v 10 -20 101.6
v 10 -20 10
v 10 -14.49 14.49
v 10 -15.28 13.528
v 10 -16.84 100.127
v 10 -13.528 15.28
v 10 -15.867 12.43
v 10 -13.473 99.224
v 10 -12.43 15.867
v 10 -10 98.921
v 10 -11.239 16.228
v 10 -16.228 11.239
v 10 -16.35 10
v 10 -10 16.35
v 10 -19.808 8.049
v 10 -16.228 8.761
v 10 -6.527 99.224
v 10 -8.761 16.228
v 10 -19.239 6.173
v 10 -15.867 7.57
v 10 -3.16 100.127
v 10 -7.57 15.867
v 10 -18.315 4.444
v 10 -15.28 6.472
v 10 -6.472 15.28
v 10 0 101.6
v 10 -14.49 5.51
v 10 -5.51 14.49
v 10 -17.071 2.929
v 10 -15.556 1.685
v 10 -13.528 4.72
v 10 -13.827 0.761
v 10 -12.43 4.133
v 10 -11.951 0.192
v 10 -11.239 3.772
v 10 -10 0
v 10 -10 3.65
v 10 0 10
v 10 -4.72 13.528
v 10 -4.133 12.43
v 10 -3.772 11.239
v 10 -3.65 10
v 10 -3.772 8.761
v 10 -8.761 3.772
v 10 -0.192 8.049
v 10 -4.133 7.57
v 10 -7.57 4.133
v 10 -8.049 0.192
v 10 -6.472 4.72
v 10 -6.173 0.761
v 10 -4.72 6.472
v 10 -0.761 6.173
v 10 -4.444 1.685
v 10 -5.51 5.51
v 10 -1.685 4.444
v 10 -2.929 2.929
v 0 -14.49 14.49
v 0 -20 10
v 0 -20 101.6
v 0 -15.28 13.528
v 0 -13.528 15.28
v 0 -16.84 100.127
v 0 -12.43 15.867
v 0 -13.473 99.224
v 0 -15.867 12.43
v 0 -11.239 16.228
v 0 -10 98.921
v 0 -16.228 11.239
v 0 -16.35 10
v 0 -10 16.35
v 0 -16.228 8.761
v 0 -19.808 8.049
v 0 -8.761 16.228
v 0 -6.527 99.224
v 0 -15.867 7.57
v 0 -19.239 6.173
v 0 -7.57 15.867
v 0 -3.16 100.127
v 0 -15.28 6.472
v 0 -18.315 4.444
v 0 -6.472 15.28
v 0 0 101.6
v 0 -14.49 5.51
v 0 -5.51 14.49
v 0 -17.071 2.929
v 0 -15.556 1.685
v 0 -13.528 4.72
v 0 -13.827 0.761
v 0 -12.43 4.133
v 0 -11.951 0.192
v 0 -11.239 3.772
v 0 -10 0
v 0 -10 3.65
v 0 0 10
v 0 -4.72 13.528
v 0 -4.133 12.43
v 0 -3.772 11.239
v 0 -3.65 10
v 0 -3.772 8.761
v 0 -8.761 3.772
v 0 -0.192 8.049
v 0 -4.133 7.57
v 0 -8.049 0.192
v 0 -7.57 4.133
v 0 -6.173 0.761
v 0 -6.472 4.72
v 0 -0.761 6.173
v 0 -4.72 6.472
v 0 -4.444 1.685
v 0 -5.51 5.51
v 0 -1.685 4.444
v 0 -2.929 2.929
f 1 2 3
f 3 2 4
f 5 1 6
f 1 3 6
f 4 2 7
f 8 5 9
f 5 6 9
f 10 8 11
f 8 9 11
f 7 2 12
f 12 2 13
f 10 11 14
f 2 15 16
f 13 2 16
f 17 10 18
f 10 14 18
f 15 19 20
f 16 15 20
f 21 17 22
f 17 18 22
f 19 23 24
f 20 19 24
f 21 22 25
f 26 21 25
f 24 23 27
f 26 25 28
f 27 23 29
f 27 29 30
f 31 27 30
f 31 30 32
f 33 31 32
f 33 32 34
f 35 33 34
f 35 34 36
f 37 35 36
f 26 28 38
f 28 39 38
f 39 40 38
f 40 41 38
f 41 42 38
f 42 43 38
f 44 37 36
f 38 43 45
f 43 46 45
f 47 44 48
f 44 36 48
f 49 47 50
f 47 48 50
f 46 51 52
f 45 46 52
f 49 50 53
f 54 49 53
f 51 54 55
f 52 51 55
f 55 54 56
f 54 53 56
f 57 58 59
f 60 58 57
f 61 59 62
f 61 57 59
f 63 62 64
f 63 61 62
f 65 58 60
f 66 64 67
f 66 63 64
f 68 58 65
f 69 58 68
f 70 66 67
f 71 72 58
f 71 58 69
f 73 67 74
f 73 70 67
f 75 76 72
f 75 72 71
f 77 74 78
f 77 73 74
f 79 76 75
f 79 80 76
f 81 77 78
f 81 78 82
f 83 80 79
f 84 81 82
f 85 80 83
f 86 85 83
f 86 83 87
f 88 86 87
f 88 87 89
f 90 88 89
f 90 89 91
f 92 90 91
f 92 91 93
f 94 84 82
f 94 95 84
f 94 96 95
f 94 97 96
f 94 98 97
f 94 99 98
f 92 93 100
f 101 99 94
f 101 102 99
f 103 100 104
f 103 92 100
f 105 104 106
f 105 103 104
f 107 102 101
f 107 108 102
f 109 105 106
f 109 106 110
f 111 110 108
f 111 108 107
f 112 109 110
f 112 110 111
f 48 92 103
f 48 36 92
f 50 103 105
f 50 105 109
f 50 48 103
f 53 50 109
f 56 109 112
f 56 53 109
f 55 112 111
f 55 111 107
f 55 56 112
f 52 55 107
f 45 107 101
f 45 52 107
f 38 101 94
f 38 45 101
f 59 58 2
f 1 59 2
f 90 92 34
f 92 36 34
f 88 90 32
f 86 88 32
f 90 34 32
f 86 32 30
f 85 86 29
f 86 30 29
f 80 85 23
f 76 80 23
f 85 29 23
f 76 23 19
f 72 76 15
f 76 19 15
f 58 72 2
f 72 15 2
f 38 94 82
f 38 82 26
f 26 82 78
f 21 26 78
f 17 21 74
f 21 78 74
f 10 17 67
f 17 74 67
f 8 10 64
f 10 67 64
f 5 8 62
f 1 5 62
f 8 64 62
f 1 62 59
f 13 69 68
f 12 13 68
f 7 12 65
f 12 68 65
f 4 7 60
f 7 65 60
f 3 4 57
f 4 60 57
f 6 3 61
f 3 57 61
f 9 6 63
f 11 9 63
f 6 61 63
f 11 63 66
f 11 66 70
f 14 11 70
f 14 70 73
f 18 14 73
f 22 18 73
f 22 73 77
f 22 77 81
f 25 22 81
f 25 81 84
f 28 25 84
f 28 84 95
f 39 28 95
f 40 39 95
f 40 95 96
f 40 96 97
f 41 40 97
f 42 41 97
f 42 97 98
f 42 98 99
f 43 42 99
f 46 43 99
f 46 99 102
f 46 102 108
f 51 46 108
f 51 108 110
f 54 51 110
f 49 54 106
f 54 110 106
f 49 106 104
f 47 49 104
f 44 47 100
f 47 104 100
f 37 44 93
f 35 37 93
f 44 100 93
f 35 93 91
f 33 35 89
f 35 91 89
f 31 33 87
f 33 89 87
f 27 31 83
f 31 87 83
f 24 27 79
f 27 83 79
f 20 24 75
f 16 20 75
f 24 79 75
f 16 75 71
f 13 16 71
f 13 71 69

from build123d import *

# Parameters (mm, degrees)
F0_W     = 10
F0_H     = 20
F1_DEPTH = 101.6
F2_R     = 6.35
F2_R_2   = 20
F3_DEPTH = 25.4
F4_R     = 9.99999


# Not quite as in the source:
# - a fillet or chamfer is up to 0.001 mm smaller than in the source, because OpenCascade refuses the exact size


with BuildPart() as f1:
    # F0 (on Top) → F1 (new body)
    with BuildSketch(Plane.XY):
        with Locations((5, -10)):
            Rectangle(F0_W, F0_H)
    extrude(amount=F1_DEPTH)

    # F2 (on face) → F3 (cut)
    with BuildSketch(Plane(origin=(0, 0, 0), x_dir=(0, -1, 0), z_dir=(-1, 0, 0))):
        with Locations((10, 10)):
            Circle(F2_R)
        with Locations((10, 118.9205080757)):
            Circle(F2_R_2)
    extrude(amount=-F3_DEPTH, mode=Mode.SUBTRACT)

    # F4 (radius 10 in the source; OpenCascade refuses exactly that, so slightly less here)
    f4_edges = [f1.edges().sort_by_distance(p)[0] for p in [
        (5, -20, 0),
        (5, 0, 0),
    ]]
    fillet(f4_edges, radius=F4_R)


solid = f1.part
